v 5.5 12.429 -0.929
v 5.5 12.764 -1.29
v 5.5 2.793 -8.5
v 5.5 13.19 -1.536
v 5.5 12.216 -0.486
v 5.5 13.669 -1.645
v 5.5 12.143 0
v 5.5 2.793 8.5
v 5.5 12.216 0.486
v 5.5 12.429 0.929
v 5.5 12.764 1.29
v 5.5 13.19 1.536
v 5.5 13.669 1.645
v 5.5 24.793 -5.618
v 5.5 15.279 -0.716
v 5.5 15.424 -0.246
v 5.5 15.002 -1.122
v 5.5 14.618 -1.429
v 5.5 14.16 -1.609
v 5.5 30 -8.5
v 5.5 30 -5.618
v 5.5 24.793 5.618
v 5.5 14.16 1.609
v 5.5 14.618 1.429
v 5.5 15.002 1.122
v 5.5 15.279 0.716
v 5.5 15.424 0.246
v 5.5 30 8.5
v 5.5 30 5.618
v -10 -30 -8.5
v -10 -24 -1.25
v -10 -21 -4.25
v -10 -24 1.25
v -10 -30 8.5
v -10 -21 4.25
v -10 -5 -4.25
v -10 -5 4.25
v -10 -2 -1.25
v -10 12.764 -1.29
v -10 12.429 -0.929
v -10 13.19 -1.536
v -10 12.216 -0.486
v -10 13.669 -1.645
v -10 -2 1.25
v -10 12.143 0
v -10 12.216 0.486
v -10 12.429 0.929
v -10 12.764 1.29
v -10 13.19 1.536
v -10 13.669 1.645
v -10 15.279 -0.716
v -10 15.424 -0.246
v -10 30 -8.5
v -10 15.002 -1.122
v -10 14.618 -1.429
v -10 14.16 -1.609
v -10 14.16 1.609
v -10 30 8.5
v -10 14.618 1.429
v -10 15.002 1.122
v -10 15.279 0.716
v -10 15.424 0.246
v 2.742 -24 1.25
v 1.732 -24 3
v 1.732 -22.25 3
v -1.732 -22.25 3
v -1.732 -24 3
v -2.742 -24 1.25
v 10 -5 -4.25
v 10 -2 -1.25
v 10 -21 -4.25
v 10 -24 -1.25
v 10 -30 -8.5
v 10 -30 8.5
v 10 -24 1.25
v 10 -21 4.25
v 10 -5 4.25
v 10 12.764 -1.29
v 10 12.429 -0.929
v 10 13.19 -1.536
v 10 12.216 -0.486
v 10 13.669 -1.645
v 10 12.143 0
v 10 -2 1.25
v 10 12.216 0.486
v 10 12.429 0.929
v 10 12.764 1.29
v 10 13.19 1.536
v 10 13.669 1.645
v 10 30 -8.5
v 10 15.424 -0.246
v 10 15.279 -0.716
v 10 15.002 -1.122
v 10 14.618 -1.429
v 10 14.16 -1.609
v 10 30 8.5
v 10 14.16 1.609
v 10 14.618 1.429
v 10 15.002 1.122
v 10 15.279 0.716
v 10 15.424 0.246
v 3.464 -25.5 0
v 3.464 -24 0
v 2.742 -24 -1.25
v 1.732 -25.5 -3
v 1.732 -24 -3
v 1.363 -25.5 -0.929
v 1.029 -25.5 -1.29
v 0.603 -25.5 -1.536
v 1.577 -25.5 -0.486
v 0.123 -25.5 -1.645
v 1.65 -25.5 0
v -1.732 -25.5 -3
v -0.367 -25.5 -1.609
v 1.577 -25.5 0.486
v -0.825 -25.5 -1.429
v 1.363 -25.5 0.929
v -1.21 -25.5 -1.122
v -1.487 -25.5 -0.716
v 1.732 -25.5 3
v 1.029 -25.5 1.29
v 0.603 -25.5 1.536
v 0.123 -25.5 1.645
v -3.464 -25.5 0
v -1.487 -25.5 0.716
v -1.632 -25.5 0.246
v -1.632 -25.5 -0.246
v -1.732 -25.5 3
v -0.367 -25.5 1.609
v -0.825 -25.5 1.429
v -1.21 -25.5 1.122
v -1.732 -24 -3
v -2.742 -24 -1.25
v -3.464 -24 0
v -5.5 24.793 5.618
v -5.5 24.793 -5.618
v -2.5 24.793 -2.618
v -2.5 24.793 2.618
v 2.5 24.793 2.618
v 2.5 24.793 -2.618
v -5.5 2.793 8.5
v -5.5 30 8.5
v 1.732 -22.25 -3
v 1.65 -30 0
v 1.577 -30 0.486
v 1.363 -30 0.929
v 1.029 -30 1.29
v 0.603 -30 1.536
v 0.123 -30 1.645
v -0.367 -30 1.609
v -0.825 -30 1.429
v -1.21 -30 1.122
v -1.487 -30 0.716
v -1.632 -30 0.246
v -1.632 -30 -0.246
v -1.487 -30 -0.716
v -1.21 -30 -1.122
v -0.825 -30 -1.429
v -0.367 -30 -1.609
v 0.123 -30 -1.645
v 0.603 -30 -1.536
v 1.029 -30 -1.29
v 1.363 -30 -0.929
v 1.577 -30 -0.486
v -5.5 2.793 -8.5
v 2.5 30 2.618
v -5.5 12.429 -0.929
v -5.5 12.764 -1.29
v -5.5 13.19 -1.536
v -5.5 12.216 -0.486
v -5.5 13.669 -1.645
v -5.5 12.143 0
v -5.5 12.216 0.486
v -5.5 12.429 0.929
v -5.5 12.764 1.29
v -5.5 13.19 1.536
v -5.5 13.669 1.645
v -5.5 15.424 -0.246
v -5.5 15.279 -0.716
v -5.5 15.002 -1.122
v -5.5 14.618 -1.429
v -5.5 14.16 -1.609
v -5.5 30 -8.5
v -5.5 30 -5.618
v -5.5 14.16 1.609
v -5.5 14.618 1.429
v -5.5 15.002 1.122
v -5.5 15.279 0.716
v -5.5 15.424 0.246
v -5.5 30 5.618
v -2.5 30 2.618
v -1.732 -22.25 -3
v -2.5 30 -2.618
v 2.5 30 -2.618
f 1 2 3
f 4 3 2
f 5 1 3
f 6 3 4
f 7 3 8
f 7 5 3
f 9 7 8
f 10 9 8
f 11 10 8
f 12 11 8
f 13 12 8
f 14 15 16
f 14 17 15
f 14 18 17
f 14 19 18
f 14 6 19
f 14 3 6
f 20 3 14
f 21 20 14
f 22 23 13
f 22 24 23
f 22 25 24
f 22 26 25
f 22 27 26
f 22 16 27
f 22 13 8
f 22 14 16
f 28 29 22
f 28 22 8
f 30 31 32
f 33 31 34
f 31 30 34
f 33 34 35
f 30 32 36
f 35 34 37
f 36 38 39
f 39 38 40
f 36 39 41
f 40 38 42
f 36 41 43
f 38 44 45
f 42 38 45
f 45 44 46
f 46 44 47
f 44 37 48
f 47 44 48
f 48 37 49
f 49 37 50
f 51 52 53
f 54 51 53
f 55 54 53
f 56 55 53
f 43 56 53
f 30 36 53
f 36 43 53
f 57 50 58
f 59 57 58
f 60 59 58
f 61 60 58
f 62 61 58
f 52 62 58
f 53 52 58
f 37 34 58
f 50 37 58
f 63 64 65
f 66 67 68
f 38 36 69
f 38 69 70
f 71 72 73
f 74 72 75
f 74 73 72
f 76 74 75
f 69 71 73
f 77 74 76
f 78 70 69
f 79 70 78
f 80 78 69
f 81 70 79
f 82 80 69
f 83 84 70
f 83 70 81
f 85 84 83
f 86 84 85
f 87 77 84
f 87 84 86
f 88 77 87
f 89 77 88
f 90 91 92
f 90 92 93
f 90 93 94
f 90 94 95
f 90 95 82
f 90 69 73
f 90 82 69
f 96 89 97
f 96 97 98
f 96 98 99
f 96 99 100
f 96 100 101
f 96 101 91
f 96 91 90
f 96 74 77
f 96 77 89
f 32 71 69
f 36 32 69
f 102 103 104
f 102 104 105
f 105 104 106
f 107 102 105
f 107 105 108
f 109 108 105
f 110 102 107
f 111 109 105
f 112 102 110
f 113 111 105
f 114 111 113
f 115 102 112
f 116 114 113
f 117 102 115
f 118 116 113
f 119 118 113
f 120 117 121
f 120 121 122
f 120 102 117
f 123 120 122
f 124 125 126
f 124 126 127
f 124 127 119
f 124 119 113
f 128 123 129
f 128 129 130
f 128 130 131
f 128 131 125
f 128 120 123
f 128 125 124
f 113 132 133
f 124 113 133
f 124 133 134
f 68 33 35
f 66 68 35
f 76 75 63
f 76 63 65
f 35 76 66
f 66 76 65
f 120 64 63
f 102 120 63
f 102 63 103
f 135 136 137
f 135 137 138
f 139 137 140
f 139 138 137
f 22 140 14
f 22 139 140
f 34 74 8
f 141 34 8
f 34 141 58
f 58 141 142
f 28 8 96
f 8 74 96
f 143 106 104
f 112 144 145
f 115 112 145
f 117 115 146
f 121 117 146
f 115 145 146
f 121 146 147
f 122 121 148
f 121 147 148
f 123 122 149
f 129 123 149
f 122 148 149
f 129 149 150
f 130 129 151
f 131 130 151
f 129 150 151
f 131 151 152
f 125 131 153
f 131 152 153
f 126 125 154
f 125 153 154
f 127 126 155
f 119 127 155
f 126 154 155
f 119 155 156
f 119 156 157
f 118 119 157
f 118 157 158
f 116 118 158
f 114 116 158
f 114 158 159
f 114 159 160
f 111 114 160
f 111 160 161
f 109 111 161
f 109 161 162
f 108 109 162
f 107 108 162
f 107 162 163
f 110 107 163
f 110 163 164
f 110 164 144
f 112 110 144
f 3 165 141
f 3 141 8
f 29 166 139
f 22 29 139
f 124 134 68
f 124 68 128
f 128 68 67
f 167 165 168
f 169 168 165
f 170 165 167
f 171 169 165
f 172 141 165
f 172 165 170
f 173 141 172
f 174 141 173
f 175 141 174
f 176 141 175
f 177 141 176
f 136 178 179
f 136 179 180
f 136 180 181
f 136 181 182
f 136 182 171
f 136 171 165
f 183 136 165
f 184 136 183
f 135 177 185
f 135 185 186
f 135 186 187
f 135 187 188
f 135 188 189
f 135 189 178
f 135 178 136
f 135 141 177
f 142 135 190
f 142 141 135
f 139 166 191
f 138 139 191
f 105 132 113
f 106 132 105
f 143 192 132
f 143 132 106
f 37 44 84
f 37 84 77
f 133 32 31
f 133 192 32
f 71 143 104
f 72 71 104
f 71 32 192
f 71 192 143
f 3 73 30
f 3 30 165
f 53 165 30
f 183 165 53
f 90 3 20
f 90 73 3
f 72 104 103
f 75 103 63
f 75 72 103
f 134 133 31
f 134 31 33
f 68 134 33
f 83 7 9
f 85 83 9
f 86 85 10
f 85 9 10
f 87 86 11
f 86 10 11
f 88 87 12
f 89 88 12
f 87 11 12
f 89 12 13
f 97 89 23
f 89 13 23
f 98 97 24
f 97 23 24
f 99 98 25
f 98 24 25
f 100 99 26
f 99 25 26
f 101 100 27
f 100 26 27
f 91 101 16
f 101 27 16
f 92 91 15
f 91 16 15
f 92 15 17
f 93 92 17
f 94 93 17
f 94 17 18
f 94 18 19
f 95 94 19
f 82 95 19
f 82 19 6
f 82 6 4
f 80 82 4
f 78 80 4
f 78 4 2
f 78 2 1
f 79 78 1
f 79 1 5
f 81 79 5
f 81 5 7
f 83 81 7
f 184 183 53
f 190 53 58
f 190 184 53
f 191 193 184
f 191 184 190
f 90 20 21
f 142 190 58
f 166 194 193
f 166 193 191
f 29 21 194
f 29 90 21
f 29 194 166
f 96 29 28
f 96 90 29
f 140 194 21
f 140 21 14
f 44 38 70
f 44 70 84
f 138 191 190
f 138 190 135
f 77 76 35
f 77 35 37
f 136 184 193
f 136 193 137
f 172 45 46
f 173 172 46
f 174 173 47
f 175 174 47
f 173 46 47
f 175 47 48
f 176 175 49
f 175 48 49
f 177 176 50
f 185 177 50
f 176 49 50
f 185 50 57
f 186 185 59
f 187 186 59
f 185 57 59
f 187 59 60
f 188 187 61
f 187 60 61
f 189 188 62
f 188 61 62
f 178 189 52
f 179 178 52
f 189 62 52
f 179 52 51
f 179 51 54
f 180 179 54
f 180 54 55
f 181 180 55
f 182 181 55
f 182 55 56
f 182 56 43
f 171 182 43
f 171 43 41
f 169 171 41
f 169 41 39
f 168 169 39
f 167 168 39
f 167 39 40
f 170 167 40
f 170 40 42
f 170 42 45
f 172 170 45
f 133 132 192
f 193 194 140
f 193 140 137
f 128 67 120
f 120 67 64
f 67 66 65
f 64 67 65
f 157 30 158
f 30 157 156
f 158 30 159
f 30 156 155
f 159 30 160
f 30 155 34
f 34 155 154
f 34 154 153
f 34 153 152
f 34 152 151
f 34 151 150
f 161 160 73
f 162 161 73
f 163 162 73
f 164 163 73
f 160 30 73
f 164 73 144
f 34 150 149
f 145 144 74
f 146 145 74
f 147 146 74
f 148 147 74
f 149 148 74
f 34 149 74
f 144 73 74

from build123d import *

# Parameters (mm, degrees)
F0_W          = 60
F0_H          = 17
F1_DEPTH      = 10
F2_W          = 22
F2_H          = 8.5
F3_DEPTH      = 25
F4_W          = 11
F4_H          = 22
F5_DEPTH      = 25
F6_R          = 1.65
F7_DEPTH      = 25
F8_W          = 11
F8_H          = 5.8824277986
F9_DEPTH      = 6
F10_SIZE      = 3
F12_DEPTH     = 1.5
F13_R         = 1.65
F14_DEPTH     = 10
F15_T1_DEPTH  = 20
F15_T6_DEPTH  = 20
F15_T12_DEPTH = 20
F15_T18_DEPTH = 20
F15_T25_DEPTH = 20
F15_T31_DEPTH = 20
F15_T37_DEPTH = 20
F15_T43_DEPTH = 20
F15_T49_DEPTH = 20
F15_T56_DEPTH = 20
F15_T62_DEPTH = 20


# Not quite as in the source:
# - a fillet or chamfer that OpenCascade refuses, or shapes differently, is made with other operations: its cross-section is extruded or revolved along the edge and cut away or added


with BuildPart() as f1:
    # F0 (on Right) → F1 (new body, symmetric)
    with BuildSketch(Plane.YZ):
        Rectangle(F0_W, F0_H)
    extrude(amount=F1_DEPTH, both=True)

    # F2 (on face) → F3 (cut)
    with BuildSketch(Plane.YZ.offset(10)):
        with Locations((-13, 0)):
            Rectangle(F2_W, F2_H)
    extrude(amount=-F3_DEPTH, mode=Mode.SUBTRACT)

    # F4 (on face) → F5 (cut)
    with BuildSketch(Plane.XY.offset(8.5)):
        with Locations((0, 13.7926964089)):
            Rectangle(F4_W, F4_H)
    extrude(amount=-F5_DEPTH, mode=Mode.SUBTRACT)

    # F6 (on face) → F7 (cut)
    with BuildSketch(Plane(origin=(-10, 0, 0), x_dir=(0, -1, 0), z_dir=(-1, 0, 0))):
        with Locations((-13.7926964089, 0)):
            Circle(F6_R)
    extrude(amount=-F7_DEPTH, mode=Mode.SUBTRACT)

    # F8 (on face) → F9 (cut)
    with BuildSketch(Plane(origin=(0, 30, 0), x_dir=(-1, 0, 0), z_dir=(0, 1, 0))):
        with Locations((0, 5.5587861007)):
            Rectangle(F8_W, F8_H)
        with Locations((0, -5.5587861007)):
            Rectangle(F8_W, F8_H)
    extrude(amount=-F9_DEPTH, mode=Mode.SUBTRACT)

    # F10
    f10_edges = [f1.edges().sort_by_distance(p)[0] for p in [
        (-5.5, 27.396348, 2.617572),
        (5.5, 27.396348, 2.617572),
        (5.5, 27.396348, -2.617572),
        (-5.5, 27.396348, -2.617572),
    ]]
    chamfer(f10_edges, length=F10_SIZE)

    # F11 (on face) → F12 (cut, symmetric)
    with BuildSketch(Plane(origin=(0, -24, 0), x_dir=(-1, 0, 0), z_dir=(0, 1, 0))):
        Polygon((-1.7320508076, 3), (-3.4641016151, 0), (-1.7320508076, -3), (1.7320508076, -3), (3.4641016151, 0), (1.7320508076, 3), align=None)
    extrude(amount=F12_DEPTH, both=True, mode=Mode.SUBTRACT)

    # F13 (on face) → F14 (cut)
    with BuildSketch(Plane.XZ.offset(30)):
        Circle(F13_R)
    extrude(amount=-F14_DEPTH, mode=Mode.SUBTRACT)

    # F15: chamfer of 3 on 4 edges, made by hand

    # F15_s2 → F15_t1 (join)
    with BuildSketch(Plane.YZ.offset(-10)):
        Polygon((-2, 1.25), (-5, 4.25), (-2, 4.25), align=None)
        Polygon((-5, -4.25), (-2, -1.25), (-2, -4.25), align=None)
    extrude(amount=F15_T1_DEPTH)


with BuildPart() as f15_tool4:
    # F15_s5 → F15_t6 (new body)
    with BuildSketch(Plane.YZ.offset(10)):
        Polygon((-21, -4.25), (-24, -1.25), (-24, -4.25), align=None)
    extrude(amount=-F15_T6_DEPTH)

    split(bisect_by=Plane.XY.offset(-3), keep=Keep.BOTTOM)

    split(bisect_by=Plane(origin=(2.5980762114, 0, -1.5), x_dir=(0, 1, 0), z_dir=(0.8660254038, 0, -0.5)), keep=Keep.TOP)


with BuildPart() as f1_1:
    add(f1.part)

    # F15_t3: union F15_tool4
    add(f15_tool4.part)


with BuildPart() as f15_tool10:
    # F15_s11 → F15_t12 (new body)
    with BuildSketch(Plane.YZ.offset(10)):
        Polygon((-21, -4.25), (-24, -1.25), (-24, -4.25), align=None)
    extrude(amount=-F15_T12_DEPTH)

    split(bisect_by=Plane.XY.offset(-3), keep=Keep.TOP)

    split(bisect_by=Plane(origin=(2.5980762114, 0, -1.5), x_dir=(0, 1, 0), z_dir=(0.8660254038, 0, -0.5)), keep=Keep.TOP)


with BuildPart() as f1_2:
    add(f1_1.part)

    # F15_t9: union F15_tool10
    add(f15_tool10.part)


with BuildPart() as f15_tool16:
    # F15_s17 → F15_t18 (new body)
    with BuildSketch(Plane.YZ.offset(10)):
        Polygon((-21, -4.25), (-24, -1.25), (-24, -4.25), align=None)
    extrude(amount=-F15_T18_DEPTH)

    split(bisect_by=Plane(origin=(-2.5980762114, 0, -1.5), x_dir=(0, 1, 0), z_dir=(0.8660254038, 0, 0.5)), keep=Keep.TOP)

    split(bisect_by=Plane.XY.offset(-3), keep=Keep.BOTTOM)

    split(bisect_by=Plane(origin=(2.5980762114, 0, -1.5), x_dir=(0, 1, 0), z_dir=(-0.8660254038, 0, 0.5)), keep=Keep.TOP)


with BuildPart() as f1_3:
    add(f1_2.part)

    # F15_t15: union F15_tool16
    add(f15_tool16.part)


with BuildPart() as f15_tool23:
    # F15_s24 → F15_t25 (new body)
    with BuildSketch(Plane.YZ.offset(10)):
        Polygon((-21, -4.25), (-24, -1.25), (-24, -4.25), align=None)
    extrude(amount=-F15_T25_DEPTH)

    split(bisect_by=Plane(origin=(-2.5980762114, 0, -1.5), x_dir=(0, 1, 0), z_dir=(-0.8660254038, 0, -0.5)), keep=Keep.TOP)

    split(bisect_by=Plane.XY.offset(-3), keep=Keep.BOTTOM)


with BuildPart() as f1_4:
    add(f1_3.part)

    # F15_t22: union F15_tool23
    add(f15_tool23.part)


with BuildPart() as f15_tool29:
    # F15_s30 → F15_t31 (new body)
    with BuildSketch(Plane.YZ.offset(10)):
        Polygon((-21, -4.25), (-24, -1.25), (-24, -4.25), align=None)
    extrude(amount=-F15_T31_DEPTH)

    split(bisect_by=Plane(origin=(-2.5980762114, 0, -1.5), x_dir=(0, 1, 0), z_dir=(-0.8660254038, 0, -0.5)), keep=Keep.TOP)

    split(bisect_by=Plane.XY.offset(-3), keep=Keep.TOP)


with BuildPart() as f1_5:
    add(f1_4.part)

    # F15_t28: union F15_tool29
    add(f15_tool29.part)


with BuildPart() as f15_tool35:
    # F15_s36 → F15_t37 (new body)
    with BuildSketch(Plane.YZ.offset(10)):
        Polygon((-24, 1.25), (-21, 4.25), (-24, 4.25), align=None)
    extrude(amount=-F15_T37_DEPTH)

    split(bisect_by=Plane(origin=(2.5980762114, 0, 1.5), x_dir=(0, 1, 0), z_dir=(0.8660254038, 0, 0.5)), keep=Keep.TOP)

    split(bisect_by=Plane.XY.offset(3), keep=Keep.BOTTOM)


with BuildPart() as f1_6:
    add(f1_5.part)

    # F15_t34: union F15_tool35
    add(f15_tool35.part)


with BuildPart() as f15_tool41:
    # F15_s42 → F15_t43 (new body)
    with BuildSketch(Plane.YZ.offset(10)):
        Polygon((-24, 1.25), (-21, 4.25), (-24, 4.25), align=None)
    extrude(amount=-F15_T43_DEPTH)

    split(bisect_by=Plane(origin=(2.5980762114, 0, 1.5), x_dir=(0, 1, 0), z_dir=(0.8660254038, 0, 0.5)), keep=Keep.TOP)

    split(bisect_by=Plane.XY.offset(3), keep=Keep.TOP)


with BuildPart() as f1_7:
    add(f1_6.part)

    # F15_t40: union F15_tool41
    add(f15_tool41.part)


with BuildPart() as f15_tool47:
    # F15_s48 → F15_t49 (new body)
    with BuildSketch(Plane.YZ.offset(10)):
        Polygon((-24, 1.25), (-21, 4.25), (-24, 4.25), align=None)
    extrude(amount=-F15_T49_DEPTH)

    split(bisect_by=Plane(origin=(-2.5980762114, 0, 1.5), x_dir=(0, 1, 0), z_dir=(0.8660254038, 0, -0.5)), keep=Keep.TOP)

    split(bisect_by=Plane(origin=(2.5980762114, 0, 1.5), x_dir=(0, 1, 0), z_dir=(-0.8660254038, 0, -0.5)), keep=Keep.TOP)

    split(bisect_by=Plane.XY.offset(3), keep=Keep.TOP)


with BuildPart() as f1_8:
    add(f1_7.part)

    # F15_t46: union F15_tool47
    add(f15_tool47.part)


with BuildPart() as f15_tool54:
    # F15_s55 → F15_t56 (new body)
    with BuildSketch(Plane.YZ.offset(10)):
        Polygon((-24, 1.25), (-21, 4.25), (-24, 4.25), align=None)
    extrude(amount=-F15_T56_DEPTH)

    split(bisect_by=Plane(origin=(-2.5980762114, 0, 1.5), x_dir=(0, 1, 0), z_dir=(-0.8660254038, 0, 0.5)), keep=Keep.TOP)

    split(bisect_by=Plane.XY.offset(3), keep=Keep.BOTTOM)


with BuildPart() as f1_9:
    add(f1_8.part)

    # F15_t53: union F15_tool54
    add(f15_tool54.part)


with BuildPart() as f15_tool60:
    # F15_s61 → F15_t62 (new body)
    with BuildSketch(Plane.YZ.offset(10)):
        Polygon((-24, 1.25), (-21, 4.25), (-24, 4.25), align=None)
    extrude(amount=-F15_T62_DEPTH)

    split(bisect_by=Plane(origin=(-2.5980762114, 0, 1.5), x_dir=(0, 1, 0), z_dir=(-0.8660254038, 0, 0.5)), keep=Keep.TOP)

    split(bisect_by=Plane.XY.offset(3), keep=Keep.TOP)


with BuildPart() as f1_10:
    add(f1_9.part)

    # F15_t59: union F15_tool60
    add(f15_tool60.part)


solid = f1_10.part
